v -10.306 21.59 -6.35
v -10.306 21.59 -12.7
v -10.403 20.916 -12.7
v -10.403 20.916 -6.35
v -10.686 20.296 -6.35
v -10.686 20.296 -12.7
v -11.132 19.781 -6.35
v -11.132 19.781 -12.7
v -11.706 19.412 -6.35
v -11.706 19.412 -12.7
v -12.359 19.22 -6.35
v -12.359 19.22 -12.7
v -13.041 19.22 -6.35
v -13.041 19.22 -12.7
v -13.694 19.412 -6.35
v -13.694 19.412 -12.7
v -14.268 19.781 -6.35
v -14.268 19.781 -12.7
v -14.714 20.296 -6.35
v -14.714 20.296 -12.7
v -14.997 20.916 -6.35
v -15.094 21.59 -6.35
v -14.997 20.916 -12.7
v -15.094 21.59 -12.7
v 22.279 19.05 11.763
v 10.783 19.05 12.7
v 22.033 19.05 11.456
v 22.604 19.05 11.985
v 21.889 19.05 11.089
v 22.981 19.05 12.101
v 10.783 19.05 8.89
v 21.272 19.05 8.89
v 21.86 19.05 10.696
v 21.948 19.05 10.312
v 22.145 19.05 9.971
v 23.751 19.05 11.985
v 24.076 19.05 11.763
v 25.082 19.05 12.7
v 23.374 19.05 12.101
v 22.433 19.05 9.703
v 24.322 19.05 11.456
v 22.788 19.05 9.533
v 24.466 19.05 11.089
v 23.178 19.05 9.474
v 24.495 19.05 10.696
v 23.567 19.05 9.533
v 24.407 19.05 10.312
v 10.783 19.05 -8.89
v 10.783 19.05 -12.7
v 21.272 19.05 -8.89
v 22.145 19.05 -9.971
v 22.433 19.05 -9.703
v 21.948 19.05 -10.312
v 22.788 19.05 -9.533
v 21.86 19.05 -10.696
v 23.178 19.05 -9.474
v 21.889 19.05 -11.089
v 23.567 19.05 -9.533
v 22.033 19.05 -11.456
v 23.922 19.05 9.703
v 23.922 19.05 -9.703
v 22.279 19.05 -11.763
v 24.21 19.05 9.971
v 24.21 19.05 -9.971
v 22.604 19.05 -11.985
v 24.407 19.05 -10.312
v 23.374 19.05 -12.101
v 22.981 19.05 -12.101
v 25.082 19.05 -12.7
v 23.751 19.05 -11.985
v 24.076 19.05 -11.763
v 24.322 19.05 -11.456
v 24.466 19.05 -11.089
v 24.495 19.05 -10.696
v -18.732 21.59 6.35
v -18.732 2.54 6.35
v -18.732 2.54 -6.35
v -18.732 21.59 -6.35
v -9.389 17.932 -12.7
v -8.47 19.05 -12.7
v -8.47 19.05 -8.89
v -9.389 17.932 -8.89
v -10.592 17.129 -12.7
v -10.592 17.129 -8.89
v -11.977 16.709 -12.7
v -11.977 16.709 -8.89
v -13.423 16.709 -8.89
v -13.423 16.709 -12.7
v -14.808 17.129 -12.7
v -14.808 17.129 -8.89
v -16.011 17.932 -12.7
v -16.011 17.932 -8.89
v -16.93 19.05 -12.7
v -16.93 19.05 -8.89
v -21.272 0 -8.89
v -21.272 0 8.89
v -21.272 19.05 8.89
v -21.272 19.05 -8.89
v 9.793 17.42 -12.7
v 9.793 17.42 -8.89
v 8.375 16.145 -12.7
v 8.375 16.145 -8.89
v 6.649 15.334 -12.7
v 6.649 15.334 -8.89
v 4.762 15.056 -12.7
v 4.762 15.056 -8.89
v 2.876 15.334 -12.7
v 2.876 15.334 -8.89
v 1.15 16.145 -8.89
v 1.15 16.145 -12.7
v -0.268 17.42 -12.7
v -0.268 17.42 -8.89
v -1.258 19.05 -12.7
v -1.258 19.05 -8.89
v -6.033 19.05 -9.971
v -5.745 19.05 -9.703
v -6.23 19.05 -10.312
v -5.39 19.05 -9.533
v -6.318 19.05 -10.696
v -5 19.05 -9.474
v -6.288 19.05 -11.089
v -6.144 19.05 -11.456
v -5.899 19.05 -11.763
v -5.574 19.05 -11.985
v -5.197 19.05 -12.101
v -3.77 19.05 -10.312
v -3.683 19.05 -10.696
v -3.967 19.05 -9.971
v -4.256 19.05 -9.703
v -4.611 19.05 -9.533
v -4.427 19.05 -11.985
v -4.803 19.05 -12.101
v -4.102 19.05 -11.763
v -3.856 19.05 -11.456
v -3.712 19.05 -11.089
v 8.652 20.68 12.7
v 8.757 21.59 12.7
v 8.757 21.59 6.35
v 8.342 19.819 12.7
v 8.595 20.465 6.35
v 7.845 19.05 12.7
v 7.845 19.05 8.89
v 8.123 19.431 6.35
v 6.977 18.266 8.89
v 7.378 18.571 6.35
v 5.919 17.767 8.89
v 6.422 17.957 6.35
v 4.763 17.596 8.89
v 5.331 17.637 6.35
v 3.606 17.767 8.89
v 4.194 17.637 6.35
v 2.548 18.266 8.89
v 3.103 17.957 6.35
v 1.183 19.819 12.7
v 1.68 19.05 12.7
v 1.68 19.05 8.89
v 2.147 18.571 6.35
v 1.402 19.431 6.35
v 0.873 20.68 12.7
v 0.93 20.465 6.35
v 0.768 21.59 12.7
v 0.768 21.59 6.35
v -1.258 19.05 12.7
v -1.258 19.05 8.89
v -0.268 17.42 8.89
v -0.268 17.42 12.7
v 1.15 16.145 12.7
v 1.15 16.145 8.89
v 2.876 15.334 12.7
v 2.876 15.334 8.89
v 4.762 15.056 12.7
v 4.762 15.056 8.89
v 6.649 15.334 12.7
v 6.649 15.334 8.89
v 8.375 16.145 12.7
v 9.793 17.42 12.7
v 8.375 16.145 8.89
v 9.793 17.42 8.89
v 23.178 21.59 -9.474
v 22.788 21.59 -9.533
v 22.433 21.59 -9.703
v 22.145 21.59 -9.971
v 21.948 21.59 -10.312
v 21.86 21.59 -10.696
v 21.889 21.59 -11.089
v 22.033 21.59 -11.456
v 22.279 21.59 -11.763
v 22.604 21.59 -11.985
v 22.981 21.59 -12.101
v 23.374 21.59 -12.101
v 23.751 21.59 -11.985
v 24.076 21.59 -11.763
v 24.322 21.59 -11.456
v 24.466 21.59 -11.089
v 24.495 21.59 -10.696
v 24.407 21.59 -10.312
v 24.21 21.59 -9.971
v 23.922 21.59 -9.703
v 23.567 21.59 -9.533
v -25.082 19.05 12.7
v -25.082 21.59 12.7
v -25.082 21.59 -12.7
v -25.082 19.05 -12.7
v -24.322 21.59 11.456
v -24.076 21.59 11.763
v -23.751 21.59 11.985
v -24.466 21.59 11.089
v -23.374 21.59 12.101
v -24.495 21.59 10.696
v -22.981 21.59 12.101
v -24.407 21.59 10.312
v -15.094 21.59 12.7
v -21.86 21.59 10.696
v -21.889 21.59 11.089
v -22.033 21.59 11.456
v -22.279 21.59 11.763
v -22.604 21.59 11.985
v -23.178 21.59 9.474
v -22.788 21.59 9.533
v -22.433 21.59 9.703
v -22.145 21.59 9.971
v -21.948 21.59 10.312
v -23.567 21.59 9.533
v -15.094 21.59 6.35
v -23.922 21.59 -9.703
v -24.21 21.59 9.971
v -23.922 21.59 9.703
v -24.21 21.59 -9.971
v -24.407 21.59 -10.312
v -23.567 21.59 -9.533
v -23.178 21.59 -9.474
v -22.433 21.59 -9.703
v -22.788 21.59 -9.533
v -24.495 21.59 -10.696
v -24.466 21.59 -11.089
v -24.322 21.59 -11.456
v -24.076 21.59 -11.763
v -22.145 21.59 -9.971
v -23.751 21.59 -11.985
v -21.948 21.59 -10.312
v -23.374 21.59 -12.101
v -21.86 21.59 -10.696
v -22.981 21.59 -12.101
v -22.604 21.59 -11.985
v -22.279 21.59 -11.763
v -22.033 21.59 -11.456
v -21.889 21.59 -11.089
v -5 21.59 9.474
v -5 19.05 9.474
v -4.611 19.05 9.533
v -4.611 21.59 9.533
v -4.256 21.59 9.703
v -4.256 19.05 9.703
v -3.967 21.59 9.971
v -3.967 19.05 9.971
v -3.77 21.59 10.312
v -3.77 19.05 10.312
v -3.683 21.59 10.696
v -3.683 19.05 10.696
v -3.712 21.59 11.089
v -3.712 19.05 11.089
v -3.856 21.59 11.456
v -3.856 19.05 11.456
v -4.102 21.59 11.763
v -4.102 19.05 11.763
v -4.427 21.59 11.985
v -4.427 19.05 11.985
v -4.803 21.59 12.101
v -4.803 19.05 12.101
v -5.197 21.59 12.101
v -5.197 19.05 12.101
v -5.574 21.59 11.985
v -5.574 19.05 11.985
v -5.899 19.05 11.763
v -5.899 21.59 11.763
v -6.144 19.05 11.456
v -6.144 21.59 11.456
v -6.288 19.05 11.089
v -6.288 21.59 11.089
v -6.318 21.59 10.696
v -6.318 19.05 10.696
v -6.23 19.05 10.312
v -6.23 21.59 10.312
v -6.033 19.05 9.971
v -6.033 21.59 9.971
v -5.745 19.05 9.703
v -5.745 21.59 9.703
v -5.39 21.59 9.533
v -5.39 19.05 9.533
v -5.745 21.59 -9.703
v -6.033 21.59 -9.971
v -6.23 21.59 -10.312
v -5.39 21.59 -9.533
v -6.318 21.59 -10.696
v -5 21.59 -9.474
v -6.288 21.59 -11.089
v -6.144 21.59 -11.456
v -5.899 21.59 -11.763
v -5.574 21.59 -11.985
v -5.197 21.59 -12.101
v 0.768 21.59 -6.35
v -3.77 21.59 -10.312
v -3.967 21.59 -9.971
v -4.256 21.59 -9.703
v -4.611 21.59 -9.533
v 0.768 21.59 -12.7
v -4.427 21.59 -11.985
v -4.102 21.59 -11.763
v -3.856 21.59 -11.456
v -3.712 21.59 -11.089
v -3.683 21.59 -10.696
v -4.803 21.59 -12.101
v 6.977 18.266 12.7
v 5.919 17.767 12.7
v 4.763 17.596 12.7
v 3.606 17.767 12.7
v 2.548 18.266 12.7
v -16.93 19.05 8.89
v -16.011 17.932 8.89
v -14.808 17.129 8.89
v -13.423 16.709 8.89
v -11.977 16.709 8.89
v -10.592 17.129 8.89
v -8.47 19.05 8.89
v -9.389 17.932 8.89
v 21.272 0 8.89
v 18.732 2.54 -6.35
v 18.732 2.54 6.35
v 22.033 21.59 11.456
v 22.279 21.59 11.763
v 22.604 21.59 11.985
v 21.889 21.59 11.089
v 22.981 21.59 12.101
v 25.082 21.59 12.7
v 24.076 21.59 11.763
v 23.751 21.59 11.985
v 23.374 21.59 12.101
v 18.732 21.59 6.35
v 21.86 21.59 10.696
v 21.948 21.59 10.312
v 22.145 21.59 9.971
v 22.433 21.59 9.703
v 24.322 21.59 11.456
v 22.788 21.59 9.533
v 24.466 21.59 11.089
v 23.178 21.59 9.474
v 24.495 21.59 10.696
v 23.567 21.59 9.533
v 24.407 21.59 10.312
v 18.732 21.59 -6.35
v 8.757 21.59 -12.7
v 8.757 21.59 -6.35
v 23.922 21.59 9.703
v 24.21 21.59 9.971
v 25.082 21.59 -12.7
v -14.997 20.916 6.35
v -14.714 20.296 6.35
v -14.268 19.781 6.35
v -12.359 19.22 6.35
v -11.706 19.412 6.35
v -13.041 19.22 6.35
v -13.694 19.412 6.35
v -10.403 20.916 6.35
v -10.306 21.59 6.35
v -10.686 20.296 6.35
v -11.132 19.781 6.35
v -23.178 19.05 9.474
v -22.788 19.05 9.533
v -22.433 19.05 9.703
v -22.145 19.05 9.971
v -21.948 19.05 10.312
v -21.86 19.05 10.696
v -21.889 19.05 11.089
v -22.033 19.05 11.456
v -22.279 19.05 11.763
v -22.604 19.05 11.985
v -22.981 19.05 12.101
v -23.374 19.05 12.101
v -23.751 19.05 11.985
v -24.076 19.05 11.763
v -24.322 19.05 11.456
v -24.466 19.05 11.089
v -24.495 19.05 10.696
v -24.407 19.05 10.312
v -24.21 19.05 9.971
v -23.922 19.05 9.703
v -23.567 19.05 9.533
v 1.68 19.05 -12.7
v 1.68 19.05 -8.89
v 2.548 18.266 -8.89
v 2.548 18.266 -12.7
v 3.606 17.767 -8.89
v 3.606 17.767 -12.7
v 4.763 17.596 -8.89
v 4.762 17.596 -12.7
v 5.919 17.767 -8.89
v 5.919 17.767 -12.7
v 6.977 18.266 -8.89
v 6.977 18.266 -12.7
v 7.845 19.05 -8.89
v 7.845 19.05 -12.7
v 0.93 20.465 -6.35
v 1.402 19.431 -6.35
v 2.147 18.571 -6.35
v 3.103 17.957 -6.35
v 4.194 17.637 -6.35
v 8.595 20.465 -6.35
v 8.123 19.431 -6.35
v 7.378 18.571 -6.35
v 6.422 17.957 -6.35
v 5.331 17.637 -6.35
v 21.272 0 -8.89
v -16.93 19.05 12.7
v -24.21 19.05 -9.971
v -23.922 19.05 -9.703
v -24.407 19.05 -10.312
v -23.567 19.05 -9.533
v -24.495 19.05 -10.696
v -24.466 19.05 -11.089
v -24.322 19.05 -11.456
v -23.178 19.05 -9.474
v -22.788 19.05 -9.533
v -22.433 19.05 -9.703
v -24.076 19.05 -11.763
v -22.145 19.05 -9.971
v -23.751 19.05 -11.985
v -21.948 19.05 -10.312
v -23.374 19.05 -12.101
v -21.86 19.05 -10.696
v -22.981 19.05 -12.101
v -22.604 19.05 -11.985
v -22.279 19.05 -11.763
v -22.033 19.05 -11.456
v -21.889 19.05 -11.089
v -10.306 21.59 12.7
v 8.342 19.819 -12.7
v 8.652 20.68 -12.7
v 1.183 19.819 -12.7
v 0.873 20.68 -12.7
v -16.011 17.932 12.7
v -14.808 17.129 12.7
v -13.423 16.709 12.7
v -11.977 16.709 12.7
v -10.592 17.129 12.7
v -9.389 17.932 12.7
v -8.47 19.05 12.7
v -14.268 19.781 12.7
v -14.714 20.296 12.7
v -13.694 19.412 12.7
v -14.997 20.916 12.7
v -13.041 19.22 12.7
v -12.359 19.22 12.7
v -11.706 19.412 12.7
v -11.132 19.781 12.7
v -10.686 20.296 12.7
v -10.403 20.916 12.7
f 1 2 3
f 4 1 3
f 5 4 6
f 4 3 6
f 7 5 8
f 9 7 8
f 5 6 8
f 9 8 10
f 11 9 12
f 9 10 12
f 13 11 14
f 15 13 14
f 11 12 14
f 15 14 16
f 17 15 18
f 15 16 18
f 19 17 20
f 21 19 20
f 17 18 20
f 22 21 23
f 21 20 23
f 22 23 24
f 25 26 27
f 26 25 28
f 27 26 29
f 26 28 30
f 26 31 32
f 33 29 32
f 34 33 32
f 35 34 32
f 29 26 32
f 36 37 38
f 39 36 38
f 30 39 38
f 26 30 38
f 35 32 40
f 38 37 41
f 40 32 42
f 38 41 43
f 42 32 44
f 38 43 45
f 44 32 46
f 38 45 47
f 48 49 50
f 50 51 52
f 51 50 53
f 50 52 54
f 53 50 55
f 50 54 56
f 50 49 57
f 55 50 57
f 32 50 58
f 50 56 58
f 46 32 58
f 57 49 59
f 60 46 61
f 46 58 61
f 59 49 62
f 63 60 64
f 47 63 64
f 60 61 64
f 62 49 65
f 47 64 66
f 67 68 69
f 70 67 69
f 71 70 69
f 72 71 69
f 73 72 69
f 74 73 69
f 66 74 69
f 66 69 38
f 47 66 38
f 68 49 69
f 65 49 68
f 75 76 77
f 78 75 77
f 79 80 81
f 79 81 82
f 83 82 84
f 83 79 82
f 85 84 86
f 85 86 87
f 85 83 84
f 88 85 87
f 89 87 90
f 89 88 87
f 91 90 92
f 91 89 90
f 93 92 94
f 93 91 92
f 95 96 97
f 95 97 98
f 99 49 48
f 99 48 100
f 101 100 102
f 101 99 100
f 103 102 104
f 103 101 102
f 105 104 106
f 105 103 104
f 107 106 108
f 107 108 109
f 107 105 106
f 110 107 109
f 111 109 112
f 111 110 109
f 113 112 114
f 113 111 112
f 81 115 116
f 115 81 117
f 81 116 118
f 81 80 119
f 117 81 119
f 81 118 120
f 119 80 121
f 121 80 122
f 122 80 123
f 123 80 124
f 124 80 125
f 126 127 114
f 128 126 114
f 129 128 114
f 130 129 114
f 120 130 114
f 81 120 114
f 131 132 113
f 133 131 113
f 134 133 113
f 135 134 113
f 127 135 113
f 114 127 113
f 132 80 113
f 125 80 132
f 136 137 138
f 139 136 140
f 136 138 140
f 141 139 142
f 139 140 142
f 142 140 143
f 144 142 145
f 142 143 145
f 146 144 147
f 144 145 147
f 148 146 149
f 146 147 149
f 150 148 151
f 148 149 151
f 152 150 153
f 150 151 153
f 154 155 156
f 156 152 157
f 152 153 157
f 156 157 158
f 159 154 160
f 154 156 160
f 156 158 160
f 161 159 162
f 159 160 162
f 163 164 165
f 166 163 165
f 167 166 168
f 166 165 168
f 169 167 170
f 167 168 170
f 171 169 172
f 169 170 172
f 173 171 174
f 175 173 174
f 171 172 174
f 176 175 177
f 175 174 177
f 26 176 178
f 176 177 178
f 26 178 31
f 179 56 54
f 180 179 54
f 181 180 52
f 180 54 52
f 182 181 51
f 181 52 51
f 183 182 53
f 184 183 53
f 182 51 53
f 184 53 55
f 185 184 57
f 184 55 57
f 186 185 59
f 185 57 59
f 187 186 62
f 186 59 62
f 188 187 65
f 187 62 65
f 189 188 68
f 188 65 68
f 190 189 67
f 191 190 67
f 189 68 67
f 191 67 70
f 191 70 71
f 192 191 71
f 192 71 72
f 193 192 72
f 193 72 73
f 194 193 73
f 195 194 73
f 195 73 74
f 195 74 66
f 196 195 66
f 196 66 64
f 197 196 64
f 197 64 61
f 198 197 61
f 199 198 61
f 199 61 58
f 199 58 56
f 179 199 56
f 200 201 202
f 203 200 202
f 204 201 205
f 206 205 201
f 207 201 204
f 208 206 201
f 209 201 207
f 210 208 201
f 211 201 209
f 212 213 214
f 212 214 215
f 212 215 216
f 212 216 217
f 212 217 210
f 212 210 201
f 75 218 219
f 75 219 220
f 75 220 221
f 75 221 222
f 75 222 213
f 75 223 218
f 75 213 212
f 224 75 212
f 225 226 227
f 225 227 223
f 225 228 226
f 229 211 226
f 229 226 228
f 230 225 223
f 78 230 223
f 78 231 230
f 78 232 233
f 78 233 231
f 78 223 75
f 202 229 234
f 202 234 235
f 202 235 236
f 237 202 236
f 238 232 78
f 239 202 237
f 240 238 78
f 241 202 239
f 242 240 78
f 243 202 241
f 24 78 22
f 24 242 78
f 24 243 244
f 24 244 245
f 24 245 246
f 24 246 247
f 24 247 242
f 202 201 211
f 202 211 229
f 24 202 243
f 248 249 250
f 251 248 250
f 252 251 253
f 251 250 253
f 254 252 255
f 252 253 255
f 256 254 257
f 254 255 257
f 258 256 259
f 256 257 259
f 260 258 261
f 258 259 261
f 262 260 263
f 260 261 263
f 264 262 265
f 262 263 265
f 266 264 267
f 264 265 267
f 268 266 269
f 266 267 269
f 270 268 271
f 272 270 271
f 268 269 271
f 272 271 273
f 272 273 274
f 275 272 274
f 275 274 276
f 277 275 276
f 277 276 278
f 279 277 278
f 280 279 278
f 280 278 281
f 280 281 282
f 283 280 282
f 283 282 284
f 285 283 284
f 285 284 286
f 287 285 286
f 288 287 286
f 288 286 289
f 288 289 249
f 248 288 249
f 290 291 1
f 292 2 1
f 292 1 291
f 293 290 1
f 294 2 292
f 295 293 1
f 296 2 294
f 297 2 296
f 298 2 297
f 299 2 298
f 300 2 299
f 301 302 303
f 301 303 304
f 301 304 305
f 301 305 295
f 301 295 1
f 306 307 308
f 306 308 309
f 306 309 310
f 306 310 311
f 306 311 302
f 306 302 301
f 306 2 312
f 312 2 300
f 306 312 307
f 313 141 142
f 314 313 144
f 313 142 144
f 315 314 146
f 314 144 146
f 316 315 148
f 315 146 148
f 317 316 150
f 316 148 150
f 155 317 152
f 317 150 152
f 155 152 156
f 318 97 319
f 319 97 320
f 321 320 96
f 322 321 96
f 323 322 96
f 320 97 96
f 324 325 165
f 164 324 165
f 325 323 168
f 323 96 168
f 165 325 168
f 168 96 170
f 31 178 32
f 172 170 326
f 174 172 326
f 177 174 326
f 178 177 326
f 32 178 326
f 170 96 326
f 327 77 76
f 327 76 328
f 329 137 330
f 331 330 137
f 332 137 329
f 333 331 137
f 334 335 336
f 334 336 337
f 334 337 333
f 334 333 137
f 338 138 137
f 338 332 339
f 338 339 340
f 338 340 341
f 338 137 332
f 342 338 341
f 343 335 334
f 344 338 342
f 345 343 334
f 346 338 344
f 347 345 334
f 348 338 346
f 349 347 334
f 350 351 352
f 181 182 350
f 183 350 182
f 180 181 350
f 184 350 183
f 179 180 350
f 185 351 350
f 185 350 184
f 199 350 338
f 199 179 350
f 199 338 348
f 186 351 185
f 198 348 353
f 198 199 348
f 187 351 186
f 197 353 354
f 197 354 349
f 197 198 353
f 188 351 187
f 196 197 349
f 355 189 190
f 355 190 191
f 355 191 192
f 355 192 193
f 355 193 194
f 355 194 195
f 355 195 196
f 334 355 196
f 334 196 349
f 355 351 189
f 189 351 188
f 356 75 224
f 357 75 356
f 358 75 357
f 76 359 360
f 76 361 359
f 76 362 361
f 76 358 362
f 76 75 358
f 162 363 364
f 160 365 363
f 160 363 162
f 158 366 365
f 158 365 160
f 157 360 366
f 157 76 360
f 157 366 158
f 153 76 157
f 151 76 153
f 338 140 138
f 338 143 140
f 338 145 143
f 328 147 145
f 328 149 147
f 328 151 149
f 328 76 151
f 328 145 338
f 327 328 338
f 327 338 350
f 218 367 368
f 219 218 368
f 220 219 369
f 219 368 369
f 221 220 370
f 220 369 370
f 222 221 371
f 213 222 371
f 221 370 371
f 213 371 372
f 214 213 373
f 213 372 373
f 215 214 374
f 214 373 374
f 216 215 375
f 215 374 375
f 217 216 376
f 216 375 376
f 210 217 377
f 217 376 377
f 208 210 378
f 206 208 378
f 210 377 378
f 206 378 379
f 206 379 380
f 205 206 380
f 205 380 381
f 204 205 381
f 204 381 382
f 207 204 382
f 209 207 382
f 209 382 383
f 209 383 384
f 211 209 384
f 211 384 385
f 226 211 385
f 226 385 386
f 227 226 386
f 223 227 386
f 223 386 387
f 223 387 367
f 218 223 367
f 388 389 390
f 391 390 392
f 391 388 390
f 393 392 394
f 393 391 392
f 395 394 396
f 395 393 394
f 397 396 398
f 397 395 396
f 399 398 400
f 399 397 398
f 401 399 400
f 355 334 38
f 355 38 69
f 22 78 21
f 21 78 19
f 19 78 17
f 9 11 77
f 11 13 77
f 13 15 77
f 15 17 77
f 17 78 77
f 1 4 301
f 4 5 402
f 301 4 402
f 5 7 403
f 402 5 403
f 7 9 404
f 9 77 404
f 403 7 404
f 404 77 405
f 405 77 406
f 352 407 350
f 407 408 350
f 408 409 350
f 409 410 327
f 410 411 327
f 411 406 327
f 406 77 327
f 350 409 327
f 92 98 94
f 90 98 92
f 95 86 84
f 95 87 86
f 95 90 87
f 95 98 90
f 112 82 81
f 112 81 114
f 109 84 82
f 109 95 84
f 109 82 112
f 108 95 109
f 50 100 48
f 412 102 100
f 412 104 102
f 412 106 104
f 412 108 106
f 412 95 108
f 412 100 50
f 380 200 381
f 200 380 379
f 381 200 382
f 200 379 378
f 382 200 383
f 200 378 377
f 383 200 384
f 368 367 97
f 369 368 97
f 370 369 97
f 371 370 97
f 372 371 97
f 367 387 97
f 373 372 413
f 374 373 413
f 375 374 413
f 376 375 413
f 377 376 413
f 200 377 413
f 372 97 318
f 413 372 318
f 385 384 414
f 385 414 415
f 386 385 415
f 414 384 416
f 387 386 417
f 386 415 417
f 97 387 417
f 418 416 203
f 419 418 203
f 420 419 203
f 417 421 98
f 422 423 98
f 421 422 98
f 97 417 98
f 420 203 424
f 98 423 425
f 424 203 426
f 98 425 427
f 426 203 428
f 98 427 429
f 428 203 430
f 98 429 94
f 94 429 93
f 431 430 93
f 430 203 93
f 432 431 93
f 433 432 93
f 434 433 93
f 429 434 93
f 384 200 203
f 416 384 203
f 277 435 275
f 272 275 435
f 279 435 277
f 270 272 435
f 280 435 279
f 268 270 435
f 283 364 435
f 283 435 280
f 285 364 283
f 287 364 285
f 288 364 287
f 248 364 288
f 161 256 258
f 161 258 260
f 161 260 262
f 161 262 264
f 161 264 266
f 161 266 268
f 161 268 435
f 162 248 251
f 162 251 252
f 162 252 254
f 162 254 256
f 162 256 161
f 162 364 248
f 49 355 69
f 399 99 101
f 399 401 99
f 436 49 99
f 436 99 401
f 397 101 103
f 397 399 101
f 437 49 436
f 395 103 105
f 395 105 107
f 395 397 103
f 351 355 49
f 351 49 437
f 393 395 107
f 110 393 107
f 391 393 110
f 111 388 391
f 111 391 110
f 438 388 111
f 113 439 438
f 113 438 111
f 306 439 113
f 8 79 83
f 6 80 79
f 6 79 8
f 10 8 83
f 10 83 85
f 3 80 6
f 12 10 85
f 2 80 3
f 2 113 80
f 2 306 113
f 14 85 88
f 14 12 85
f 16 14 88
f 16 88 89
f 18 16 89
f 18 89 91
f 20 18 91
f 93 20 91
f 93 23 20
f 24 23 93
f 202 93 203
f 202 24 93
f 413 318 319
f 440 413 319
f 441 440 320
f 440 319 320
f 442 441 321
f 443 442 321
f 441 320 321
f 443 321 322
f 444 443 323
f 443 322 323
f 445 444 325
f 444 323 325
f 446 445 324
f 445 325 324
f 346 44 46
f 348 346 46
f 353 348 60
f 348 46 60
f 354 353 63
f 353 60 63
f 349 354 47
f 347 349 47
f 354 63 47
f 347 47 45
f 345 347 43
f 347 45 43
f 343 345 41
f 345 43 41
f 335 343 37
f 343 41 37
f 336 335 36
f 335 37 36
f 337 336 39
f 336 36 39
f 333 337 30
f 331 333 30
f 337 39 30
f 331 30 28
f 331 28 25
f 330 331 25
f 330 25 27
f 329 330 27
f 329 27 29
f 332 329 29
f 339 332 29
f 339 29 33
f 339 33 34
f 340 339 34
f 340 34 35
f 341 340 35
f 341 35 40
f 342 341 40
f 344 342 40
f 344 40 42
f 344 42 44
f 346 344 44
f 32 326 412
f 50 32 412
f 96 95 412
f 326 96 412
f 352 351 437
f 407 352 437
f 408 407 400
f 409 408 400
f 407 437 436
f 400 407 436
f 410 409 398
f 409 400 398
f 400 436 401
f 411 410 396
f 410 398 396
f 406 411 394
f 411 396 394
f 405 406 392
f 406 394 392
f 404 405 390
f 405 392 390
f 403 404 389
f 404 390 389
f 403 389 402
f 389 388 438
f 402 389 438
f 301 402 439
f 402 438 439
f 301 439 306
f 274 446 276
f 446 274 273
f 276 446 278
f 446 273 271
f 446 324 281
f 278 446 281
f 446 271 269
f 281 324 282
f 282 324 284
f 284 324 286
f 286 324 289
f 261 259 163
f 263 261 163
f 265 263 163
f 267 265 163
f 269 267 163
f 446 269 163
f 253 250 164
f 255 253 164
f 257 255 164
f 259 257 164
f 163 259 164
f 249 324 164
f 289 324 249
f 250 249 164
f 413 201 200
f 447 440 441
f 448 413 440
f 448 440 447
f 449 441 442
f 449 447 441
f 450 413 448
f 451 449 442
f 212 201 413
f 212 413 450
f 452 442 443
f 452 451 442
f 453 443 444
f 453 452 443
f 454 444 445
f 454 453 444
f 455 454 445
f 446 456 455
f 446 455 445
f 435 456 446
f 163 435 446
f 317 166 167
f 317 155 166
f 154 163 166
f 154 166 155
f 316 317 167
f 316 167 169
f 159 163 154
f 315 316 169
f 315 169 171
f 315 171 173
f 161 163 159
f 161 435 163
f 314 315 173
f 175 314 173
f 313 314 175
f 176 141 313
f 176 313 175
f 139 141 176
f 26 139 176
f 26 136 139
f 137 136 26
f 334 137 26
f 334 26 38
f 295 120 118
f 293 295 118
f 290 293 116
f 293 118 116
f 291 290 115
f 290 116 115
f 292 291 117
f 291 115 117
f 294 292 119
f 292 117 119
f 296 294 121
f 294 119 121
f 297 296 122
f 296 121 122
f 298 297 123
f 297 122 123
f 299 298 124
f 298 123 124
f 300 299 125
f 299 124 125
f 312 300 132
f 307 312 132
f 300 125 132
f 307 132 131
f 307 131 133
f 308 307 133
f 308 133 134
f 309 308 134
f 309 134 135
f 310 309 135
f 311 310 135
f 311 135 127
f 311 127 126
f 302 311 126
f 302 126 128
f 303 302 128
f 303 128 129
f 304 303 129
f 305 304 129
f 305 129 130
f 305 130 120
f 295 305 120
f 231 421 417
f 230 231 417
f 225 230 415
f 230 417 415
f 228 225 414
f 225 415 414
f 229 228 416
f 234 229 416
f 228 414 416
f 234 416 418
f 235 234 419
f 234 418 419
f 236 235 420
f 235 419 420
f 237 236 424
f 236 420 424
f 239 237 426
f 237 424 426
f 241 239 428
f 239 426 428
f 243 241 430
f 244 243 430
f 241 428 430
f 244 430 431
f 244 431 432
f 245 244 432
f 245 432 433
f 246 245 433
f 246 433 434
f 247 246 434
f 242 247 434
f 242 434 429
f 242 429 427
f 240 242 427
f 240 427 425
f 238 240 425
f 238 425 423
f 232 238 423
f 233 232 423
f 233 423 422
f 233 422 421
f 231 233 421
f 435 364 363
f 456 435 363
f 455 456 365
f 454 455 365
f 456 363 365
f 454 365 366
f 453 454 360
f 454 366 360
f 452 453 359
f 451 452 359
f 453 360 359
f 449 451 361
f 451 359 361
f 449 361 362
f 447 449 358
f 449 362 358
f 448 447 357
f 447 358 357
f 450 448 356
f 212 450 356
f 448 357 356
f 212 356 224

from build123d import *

# Parameters (mm, degrees)
SKETCH1_W           = 42.545
SKETCH1_H           = 17.78
BOSS_EXTRUDE1_DEPTH = 2.54
SKETCH2_W           = 42.545
SKETCH2_H           = 17.78
SKETCH2_W_2         = 37.465
SKETCH2_H_2         = 12.7
EXTRUDE_THIN1_DEPTH = 19.05
SKETCH3_W           = 50.165
SKETCH3_H           = 25.4
SKETCH3_W_2         = 42.545
SKETCH3_H_2         = 17.78
BOSS_EXTRUDE2_DEPTH = 2.54
CUT_EXTRUDE1_REACH  = 43.718
SKETCH4_R           = 2.39395
SKETCH4_R_2         = 3.99415
BOSS_EXTRUDE3_START = 3.81
BOSS_EXTRUDE3_DEPTH = 3.81
BOSS_EXTRUDE4_DEPTH = 3.81
SKETCH7_R           = 1.321170669
CUT_EXTRUDE2_DEPTH  = 36.447847696


with BuildPart() as part:
    # Sketch1 → Boss-Extrude1 (new body)
    with BuildSketch(Plane(origin=(0, 0, 0), x_dir=(1, 0, 0), z_dir=(0, 1, 0))):
        Rectangle(SKETCH1_W, SKETCH1_H)
    extrude(amount=BOSS_EXTRUDE1_DEPTH)

    # Sketch2 → Extrude-Thin1 (add)
    with BuildSketch(Plane(origin=(0, 2.54, 0), x_dir=(1, 0, 0), z_dir=(0, 1, 0))):
        Rectangle(SKETCH2_W, SKETCH2_H)
        Rectangle(SKETCH2_W_2, SKETCH2_H_2, mode=Mode.SUBTRACT)
    extrude(amount=EXTRUDE_THIN1_DEPTH)

    # Sketch3 → Boss-Extrude2 (add)
    with BuildSketch(Plane(origin=(0, 21.59, 0), x_dir=(1, 0, 0), z_dir=(0, 1, 0))):
        Rectangle(SKETCH3_W, SKETCH3_H)
        Rectangle(SKETCH3_W_2, SKETCH3_H_2, mode=Mode.SUBTRACT)
    extrude(amount=-BOSS_EXTRUDE2_DEPTH)

    # Cut-Extrude1: up to this face of the body (flat: up to its plane)
    cut_extrude1_end = Plane(part.part.faces().sort_by_distance((0, 20.32, 12.7))[0])
    # Sketch4 → Cut-Extrude1 (cut, up to the picked face)
    with BuildSketch(Plane(origin=(0, 0, -12.7), x_dir=(-1, 0, 0), z_dir=(0, 0, -1)), mode=Mode.PRIVATE) as cut_extrude1_sk1:
        with Locations((12.7, 21.59)):
            Circle(SKETCH4_R)
    cut_extrude1_tool1 = split(extrude(cut_extrude1_sk1.sketch, amount=-CUT_EXTRUDE1_REACH, mode=Mode.PRIVATE), bisect_by=cut_extrude1_end, keep=Keep.BOTH, mode=Mode.PRIVATE)
    # Sketch4 → Cut-Extrude1 (cut, up to the picked face)
    with BuildSketch(Plane(origin=(0, 0, -12.7), x_dir=(-1, 0, 0), z_dir=(0, 0, -1)), mode=Mode.PRIVATE) as cut_extrude1_sk2:
        with Locations((-4.7625, 21.59)):
            Circle(SKETCH4_R_2)
    cut_extrude1_tool2 = split(extrude(cut_extrude1_sk2.sketch, amount=-CUT_EXTRUDE1_REACH, mode=Mode.PRIVATE), bisect_by=cut_extrude1_end, keep=Keep.BOTH, mode=Mode.PRIVATE)
    add(cut_extrude1_tool1.solids().sort_by(Axis((-12.7, 21.59, -12.7), (0, 0, 1)))[0], mode=Mode.SUBTRACT)
    add(cut_extrude1_tool2.solids().sort_by(Axis((4.7625, 21.59, -12.7), (0, 0, 1)))[0], mode=Mode.SUBTRACT)

    # Sketch5 → Boss-Extrude3 (add)
    with BuildSketch(Plane(origin=(0, 0, -8.89), x_dir=(-1, 0, 0), z_dir=(0, 0, -1)).offset(BOSS_EXTRUDE3_START)):
        with BuildLine():
            Line((-7.844972096, 19.05), (-10.782758817, 19.05))
            ThreePointArc((-10.782758817, 19.05), (-4.7625, 15.05585), (1.257758817, 19.05))
            Line((1.257758817, 19.05), (-1.680027904, 19.05))
            ThreePointArc((-1.680027904, 19.05), (-4.7625, 17.59585), (-7.844972096, 19.05))
        make_face()
        with BuildLine():
            Line((16.929924657, 19.05), (8.470075343, 19.05))
            ThreePointArc((8.470075343, 19.05), (12.7, 16.65605), (16.929924657, 19.05))
        make_face()
    extrude(amount=-BOSS_EXTRUDE3_DEPTH)

    # Sketch6 → Boss-Extrude4 (add)
    with BuildSketch(Plane.XY.offset(8.89)):
        with BuildLine():
            ThreePointArc((7.844972096, 19.05), (4.7625, 17.59585), (1.680027904, 19.05))
            Line((1.680027904, 19.05), (-1.257758817, 19.05))
            ThreePointArc((-1.257758817, 19.05), (4.7625, 15.05585), (10.782758817, 19.05))
            Line((10.782758817, 19.05), (7.844972096, 19.05))
        make_face()
        with BuildLine():
            ThreePointArc((-16.929924657, 19.05), (-12.7, 16.65605), (-8.470075343, 19.05))
            Line((-8.470075343, 19.05), (-16.929924657, 19.05))
        make_face()
    extrude(amount=BOSS_EXTRUDE4_DEPTH)

    # Sketch7 → Cut-Extrude2 (cut, through all)
    with BuildSketch(Plane.XZ):
        with Locations(Location((-5.000265623, 10.795, 0), (0, 0, 270))):
            Circle(SKETCH7_R)
        with Locations(Location((-5.000265623, -10.795, 0), (0, 0, 90))):
            Circle(SKETCH7_R)
        with Locations(Location((23.1775, 10.795, 0), (0, 0, 270))):
            Circle(SKETCH7_R)
        with Locations(Location((23.1775, -10.795, 0), (0, 0, 90))):
            Circle(SKETCH7_R)
        with Locations(Location((-23.1775, 10.795, 0), (0, 0, 270))):
            Circle(SKETCH7_R)
        with Locations(Location((-23.1775, -10.795, 0), (0, 0, 90))):
            Circle(SKETCH7_R)
    extrude(amount=-CUT_EXTRUDE2_DEPTH, mode=Mode.SUBTRACT)


solid = part.part
